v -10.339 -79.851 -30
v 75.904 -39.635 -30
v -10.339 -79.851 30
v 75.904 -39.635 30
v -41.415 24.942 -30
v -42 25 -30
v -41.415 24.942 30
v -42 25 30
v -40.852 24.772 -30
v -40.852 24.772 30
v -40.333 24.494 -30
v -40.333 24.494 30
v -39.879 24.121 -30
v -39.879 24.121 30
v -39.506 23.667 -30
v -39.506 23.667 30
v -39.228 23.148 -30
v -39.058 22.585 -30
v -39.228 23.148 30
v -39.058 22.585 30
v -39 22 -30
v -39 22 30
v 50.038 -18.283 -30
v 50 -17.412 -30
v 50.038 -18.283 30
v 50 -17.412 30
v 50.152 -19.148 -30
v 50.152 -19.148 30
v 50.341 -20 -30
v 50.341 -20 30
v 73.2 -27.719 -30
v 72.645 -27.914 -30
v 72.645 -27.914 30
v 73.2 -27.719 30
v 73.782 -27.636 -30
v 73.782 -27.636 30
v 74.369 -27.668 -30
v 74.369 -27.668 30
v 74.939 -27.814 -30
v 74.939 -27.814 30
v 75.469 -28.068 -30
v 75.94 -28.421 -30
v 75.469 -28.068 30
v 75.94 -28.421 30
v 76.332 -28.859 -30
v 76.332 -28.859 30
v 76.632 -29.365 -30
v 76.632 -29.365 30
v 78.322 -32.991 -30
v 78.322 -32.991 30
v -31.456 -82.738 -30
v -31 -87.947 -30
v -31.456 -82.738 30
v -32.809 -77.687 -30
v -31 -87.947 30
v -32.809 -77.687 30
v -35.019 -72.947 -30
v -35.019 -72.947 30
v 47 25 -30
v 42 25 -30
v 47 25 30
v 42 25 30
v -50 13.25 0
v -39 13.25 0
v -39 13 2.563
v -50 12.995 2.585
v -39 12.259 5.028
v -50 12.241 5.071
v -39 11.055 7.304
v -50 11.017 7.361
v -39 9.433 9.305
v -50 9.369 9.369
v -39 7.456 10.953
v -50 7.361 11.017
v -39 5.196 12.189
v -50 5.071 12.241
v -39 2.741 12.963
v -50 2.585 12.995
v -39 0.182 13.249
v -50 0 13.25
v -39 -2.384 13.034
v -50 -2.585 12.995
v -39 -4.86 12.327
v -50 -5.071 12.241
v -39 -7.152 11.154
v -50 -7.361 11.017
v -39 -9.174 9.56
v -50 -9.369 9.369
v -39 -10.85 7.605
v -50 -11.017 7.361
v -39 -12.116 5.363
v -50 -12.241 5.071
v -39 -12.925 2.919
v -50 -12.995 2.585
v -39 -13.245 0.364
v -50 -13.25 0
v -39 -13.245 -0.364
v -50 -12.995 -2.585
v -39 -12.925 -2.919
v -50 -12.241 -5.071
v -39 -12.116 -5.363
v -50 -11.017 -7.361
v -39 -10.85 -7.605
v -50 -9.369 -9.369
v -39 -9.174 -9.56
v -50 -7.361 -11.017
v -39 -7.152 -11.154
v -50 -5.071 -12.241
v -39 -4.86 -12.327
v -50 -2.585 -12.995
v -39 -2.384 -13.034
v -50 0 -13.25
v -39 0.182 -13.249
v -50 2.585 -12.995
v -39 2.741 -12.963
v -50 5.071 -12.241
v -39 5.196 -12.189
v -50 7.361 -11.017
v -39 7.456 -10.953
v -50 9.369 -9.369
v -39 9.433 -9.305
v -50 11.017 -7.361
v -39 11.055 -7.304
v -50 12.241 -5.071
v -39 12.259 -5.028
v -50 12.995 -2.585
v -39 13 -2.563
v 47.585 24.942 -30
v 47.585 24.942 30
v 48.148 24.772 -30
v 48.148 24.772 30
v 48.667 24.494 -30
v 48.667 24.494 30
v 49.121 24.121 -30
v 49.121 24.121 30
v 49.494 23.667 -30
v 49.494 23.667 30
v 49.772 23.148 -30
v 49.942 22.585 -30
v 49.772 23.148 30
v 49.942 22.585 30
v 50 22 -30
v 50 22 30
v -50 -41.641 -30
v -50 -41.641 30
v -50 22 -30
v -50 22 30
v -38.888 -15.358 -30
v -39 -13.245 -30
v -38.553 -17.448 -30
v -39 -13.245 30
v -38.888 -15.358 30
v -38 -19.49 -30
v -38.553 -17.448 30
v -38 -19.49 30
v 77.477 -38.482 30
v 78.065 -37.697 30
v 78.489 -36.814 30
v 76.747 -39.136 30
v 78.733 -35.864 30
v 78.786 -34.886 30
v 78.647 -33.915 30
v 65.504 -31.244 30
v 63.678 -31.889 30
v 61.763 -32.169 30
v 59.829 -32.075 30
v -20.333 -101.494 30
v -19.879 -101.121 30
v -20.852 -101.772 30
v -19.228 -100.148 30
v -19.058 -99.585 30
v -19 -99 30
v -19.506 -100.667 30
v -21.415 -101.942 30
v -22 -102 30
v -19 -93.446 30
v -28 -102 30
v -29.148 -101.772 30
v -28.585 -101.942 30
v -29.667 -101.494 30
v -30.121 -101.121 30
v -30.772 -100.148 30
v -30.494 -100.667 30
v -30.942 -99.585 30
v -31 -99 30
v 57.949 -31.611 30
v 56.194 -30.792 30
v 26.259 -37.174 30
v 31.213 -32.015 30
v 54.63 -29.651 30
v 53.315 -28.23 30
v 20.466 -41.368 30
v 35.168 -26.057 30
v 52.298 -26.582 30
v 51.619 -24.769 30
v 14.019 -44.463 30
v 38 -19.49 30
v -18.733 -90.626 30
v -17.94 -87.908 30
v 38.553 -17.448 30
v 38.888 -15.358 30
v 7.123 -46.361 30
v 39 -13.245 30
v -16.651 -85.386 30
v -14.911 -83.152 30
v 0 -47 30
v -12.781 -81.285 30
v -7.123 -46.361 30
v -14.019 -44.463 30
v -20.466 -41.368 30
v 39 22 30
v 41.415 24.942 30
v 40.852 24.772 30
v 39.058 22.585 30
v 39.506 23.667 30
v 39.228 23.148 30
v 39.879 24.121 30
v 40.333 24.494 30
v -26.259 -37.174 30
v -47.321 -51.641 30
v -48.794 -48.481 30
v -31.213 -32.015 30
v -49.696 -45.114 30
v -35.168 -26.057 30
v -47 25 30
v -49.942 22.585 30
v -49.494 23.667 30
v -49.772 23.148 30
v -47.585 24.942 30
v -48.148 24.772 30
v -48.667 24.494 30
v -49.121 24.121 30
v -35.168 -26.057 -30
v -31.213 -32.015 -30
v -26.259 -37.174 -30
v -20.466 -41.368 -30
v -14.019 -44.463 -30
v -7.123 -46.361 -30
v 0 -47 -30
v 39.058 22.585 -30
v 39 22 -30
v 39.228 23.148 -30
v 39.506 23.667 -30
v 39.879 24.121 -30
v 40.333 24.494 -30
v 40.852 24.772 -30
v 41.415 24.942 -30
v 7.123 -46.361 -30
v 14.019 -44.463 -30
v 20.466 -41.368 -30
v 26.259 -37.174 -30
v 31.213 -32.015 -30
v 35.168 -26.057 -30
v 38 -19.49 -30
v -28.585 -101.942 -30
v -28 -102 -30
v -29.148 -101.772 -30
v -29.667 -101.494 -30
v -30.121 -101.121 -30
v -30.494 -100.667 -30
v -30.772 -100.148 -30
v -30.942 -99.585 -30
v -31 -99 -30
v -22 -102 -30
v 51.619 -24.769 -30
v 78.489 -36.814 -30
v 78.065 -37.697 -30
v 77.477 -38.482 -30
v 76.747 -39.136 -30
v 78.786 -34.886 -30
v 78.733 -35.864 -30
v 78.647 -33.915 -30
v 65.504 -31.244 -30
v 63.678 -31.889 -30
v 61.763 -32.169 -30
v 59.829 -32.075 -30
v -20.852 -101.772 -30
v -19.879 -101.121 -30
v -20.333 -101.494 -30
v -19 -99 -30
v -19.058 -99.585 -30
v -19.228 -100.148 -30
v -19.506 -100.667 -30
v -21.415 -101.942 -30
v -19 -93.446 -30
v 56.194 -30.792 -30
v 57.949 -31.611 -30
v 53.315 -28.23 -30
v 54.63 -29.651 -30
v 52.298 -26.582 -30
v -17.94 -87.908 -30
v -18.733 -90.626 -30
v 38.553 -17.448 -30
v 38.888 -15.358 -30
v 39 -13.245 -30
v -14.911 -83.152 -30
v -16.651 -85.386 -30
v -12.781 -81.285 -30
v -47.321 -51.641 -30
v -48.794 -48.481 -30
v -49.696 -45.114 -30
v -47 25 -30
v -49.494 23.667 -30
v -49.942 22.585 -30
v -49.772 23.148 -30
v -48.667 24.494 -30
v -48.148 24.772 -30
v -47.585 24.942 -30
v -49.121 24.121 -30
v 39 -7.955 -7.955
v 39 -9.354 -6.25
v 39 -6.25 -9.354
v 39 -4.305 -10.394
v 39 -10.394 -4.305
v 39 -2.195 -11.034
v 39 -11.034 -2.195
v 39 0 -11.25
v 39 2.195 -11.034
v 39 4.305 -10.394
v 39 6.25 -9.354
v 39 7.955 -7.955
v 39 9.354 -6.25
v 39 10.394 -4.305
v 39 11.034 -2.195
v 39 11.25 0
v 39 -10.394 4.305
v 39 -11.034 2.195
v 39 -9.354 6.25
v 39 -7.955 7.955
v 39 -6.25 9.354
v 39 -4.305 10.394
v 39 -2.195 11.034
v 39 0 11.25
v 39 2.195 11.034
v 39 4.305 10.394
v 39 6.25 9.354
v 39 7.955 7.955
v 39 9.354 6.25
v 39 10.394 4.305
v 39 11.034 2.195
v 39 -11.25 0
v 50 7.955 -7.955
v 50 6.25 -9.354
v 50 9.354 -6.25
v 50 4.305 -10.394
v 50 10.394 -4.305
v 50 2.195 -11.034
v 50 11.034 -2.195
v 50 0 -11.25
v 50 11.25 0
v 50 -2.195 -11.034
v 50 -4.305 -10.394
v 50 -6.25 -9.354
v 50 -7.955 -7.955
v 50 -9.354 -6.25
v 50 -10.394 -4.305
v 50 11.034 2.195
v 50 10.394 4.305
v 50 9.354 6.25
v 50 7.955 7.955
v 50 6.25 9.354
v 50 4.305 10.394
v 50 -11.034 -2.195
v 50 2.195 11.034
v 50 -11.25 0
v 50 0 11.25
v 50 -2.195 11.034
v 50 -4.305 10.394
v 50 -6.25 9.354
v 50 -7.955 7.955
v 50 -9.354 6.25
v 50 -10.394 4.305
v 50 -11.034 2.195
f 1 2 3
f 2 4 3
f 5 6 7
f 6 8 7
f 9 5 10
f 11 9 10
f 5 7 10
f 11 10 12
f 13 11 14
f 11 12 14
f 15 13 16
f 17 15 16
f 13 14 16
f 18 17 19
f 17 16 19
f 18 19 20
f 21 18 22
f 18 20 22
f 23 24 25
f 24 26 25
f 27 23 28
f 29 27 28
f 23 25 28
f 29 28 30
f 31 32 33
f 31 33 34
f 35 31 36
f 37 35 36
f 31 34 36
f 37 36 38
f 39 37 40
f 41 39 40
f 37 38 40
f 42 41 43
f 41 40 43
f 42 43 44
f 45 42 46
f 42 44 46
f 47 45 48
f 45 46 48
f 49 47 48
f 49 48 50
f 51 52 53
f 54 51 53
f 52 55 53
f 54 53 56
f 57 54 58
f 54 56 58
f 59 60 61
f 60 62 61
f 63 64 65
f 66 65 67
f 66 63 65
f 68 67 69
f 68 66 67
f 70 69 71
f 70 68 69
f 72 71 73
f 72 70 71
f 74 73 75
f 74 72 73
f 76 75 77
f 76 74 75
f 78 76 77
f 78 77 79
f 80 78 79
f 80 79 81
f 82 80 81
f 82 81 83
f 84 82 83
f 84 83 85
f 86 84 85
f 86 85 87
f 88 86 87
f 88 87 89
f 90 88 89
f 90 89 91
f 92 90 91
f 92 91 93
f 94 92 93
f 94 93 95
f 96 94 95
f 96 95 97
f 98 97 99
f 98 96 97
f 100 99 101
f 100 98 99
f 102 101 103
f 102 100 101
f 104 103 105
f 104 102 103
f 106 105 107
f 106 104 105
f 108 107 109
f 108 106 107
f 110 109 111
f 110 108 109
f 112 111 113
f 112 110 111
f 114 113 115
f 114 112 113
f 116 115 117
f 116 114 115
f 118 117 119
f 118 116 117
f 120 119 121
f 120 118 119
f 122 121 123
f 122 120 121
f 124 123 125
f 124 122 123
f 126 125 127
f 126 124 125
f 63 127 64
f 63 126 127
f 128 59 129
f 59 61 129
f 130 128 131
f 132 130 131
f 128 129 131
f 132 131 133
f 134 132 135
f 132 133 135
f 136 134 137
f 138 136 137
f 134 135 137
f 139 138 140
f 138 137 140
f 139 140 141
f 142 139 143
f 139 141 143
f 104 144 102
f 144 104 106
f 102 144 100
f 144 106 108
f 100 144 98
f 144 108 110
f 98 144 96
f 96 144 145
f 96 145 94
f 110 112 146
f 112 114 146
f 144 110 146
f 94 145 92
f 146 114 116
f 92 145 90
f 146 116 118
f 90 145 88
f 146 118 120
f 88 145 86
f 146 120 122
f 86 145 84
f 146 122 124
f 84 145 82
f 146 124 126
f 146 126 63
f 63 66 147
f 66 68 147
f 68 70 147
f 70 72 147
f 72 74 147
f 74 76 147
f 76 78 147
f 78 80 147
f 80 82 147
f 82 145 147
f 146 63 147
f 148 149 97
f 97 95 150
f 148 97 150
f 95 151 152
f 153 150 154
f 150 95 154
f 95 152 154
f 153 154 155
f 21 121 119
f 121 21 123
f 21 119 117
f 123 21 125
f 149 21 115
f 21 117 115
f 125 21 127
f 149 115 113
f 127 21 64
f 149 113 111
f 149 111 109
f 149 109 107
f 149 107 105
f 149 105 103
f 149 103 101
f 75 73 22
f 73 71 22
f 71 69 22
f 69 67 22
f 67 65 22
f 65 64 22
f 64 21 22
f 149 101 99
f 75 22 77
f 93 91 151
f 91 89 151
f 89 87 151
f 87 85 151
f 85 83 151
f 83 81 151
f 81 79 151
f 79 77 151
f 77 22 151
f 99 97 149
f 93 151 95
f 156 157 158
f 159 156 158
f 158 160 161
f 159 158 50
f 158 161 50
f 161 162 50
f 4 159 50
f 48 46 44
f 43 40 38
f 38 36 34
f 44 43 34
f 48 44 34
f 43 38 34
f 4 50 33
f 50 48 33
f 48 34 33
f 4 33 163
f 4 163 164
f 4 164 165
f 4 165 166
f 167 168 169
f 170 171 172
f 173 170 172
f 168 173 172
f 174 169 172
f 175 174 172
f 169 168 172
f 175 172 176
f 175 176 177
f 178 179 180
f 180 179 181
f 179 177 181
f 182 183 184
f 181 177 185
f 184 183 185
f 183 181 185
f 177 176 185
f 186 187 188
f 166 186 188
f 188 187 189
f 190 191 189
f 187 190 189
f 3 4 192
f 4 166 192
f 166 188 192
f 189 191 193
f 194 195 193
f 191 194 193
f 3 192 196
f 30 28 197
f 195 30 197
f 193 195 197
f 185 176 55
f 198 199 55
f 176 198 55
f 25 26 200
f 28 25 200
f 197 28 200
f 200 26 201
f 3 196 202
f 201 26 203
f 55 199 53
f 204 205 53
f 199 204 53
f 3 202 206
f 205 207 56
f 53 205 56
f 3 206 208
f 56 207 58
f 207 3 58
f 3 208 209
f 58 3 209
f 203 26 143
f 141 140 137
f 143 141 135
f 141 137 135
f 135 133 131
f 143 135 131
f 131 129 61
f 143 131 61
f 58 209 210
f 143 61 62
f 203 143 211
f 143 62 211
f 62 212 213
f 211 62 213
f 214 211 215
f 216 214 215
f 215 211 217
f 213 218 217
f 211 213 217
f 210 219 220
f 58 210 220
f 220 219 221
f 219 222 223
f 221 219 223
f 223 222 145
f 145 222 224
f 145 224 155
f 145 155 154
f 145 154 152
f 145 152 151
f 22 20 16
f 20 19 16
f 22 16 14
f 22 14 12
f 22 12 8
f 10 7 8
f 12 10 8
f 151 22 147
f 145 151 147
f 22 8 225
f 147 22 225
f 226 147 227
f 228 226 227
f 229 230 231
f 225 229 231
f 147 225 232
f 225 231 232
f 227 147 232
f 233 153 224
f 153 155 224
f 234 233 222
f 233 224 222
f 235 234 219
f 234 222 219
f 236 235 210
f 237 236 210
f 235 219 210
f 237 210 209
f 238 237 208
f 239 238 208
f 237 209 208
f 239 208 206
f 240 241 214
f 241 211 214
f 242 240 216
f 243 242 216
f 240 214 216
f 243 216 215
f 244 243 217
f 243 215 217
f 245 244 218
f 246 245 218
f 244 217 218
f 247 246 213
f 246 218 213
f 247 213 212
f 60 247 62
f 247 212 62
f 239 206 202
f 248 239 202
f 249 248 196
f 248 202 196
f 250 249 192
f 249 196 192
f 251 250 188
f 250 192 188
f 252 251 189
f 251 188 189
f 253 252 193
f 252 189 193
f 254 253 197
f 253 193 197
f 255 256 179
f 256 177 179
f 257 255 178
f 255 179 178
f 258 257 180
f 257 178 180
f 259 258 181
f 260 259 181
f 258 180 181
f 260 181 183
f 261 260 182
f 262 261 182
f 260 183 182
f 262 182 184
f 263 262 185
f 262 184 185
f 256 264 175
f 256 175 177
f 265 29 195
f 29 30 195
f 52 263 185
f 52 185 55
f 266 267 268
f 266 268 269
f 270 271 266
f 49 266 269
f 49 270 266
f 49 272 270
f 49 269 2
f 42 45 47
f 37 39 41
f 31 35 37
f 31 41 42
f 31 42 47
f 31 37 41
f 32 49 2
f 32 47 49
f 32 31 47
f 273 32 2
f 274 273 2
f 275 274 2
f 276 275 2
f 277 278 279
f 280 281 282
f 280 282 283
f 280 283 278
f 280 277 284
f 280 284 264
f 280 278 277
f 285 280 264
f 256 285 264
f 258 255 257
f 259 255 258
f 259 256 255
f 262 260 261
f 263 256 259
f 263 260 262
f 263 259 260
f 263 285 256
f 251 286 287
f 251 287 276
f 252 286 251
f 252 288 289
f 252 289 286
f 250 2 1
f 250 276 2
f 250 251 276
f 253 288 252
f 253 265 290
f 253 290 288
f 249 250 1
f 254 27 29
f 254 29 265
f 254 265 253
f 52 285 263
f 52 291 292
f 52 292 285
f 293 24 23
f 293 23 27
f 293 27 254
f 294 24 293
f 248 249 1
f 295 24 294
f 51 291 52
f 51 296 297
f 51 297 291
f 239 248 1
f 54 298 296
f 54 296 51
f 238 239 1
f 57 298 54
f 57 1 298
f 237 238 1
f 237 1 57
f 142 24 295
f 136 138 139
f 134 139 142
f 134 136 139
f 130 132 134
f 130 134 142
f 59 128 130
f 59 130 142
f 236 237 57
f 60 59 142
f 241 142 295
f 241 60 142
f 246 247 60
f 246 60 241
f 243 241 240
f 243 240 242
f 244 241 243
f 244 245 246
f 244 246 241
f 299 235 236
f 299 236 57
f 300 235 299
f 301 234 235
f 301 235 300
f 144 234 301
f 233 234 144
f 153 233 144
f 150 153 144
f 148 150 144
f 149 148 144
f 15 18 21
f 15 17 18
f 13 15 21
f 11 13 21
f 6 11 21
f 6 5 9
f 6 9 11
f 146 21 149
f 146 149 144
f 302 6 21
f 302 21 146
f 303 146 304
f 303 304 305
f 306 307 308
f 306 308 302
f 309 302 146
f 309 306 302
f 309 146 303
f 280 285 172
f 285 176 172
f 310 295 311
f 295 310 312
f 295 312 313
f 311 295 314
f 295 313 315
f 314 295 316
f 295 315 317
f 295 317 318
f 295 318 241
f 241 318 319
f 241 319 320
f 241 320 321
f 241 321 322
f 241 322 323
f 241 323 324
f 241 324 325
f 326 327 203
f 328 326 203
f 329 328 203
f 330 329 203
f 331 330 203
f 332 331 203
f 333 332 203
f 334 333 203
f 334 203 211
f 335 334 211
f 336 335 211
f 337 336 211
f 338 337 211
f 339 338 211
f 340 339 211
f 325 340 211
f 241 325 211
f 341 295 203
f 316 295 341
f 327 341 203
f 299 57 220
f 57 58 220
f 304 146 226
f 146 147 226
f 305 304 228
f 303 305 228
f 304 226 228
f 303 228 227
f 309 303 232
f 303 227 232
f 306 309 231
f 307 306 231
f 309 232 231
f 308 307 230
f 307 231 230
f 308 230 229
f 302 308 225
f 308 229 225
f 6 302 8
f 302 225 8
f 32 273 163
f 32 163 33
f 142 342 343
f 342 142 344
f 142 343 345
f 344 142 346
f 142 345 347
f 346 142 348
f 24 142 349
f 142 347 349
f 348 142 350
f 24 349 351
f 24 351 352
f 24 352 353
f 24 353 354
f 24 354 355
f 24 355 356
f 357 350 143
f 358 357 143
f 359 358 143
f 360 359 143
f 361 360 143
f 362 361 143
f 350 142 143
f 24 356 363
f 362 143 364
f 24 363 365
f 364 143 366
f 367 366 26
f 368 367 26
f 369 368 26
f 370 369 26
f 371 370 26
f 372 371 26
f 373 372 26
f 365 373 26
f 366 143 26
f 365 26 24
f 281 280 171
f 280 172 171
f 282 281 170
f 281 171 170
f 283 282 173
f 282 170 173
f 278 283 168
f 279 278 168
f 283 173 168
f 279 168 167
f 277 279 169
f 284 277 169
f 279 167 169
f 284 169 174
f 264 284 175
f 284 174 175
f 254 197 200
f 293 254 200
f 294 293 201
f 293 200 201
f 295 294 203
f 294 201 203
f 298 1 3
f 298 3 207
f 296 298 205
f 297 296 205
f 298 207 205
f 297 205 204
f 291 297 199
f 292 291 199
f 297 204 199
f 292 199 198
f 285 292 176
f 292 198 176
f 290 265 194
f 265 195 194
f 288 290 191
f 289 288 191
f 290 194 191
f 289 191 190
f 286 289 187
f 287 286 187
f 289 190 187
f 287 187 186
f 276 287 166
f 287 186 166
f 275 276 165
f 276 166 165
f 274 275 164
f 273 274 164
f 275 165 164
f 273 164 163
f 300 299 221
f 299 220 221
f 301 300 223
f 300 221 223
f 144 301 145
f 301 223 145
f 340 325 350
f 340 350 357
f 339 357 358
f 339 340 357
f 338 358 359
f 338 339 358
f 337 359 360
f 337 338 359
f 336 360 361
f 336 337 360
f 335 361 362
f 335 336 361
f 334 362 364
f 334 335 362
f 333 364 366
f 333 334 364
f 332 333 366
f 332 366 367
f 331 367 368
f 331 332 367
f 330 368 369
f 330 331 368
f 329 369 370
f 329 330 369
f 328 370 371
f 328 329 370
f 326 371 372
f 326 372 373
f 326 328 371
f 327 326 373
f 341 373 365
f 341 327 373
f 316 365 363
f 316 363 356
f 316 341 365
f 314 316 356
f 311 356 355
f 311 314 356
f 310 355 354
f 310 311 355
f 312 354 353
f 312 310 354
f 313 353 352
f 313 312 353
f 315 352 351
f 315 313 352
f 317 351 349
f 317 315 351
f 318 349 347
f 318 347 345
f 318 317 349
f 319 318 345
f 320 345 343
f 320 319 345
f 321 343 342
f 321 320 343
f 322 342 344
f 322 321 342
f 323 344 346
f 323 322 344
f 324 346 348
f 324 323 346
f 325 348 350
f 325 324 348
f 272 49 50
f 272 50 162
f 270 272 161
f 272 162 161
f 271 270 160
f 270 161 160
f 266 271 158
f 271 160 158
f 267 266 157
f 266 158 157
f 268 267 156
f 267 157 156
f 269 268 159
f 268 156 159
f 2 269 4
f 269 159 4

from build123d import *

# Parameters (mm, degrees)
BASE_EXTRUDE_DEPTH = 30


with BuildPart() as part:
    # Sketch1 → Base-Extrude (new body, symmetric)
    with BuildSketch(Plane.XY):
        with BuildLine():
            Line((39, -13.244998), (39, 22))
            ThreePointArc((39, 22), (39.87868, 24.12132), (42, 25))
            Line((42, 25), (47, 25))
            ThreePointArc((47, 25), (49.12132, 24.12132), (50, 22))
            Line((50, 22), (50, -17.41181))
            ThreePointArc((50, -17.41181), (50.085551, -18.717071), (50.340742, -20))
            Line((50.340742, -20), (51.61865, -24.769217))
            ThreePointArc((51.61865, -24.769217), (57.051725, -31.244104), (65.50409, -31.244104))
            Line((65.50409, -31.244104), (72.645011, -27.914239))
            ThreePointArc((72.645011, -27.914239), (74.938926, -27.814084), (76.631789, -29.365307))
            Line((76.631789, -29.365307), (78.322262, -32.990538))
            ThreePointArc((78.322262, -32.990538), (78.489186, -36.81373), (75.903815, -39.635168))
            Line((75.903815, -39.635168), (-10.339274, -79.850981))
            ThreePointArc((-10.339274, -79.850981), (-16.650872, -85.386104), (-19, -93.445598))
            Line((-19, -93.445598), (-19, -99))
            ThreePointArc((-19, -99), (-19.87868, -101.12132), (-22, -102))
            Line((-22, -102), (-28, -102))
            ThreePointArc((-28, -102), (-30.12132, -101.12132), (-31, -99))
            Line((-31, -99), (-31, -87.947441))
            ThreePointArc((-31, -87.947441), (-32.022225, -80.18287), (-35.019238, -72.947441))
            Line((-35.019238, -72.947441), (-47.320508, -51.641016))
            ThreePointArc((-47.320508, -51.641016), (-49.318517, -46.817397), (-50, -41.641016))
            Line((-50, -41.641016), (-50, 22))
            ThreePointArc((-50, 22), (-49.12132, 24.12132), (-47, 25))
            Line((-47, 25), (-42, 25))
            ThreePointArc((-42, 25), (-39.87868, 24.12132), (-39, 22))
            Line((-39, 22), (-39, -13.244998))
            ThreePointArc((-39, -13.244998), (-38.748418, -16.407276), (-38, -19.489996))
            ThreePointArc((-38, -19.489996), (-23.456344, -39.400616), (0, -47))
            ThreePointArc((0, -47), (23.456344, -39.400616), (38, -19.489996))
            ThreePointArc((38, -19.489996), (38.748418, -16.407276), (39, -13.244998))
        make_face()
    extrude(amount=BASE_EXTRUDE_DEPTH, both=True)

    # Sketch4 → Udboring ø26.5/ø22.5 (revolve, cut)
    with BuildSketch(Plane.XY):
        Polygon((50, 11.25), (0, 11.25), (0, 13.25), (-50, 13.25), (-50, 0), (0, 0), (50, 0), align=None)
    revolve(axis=Axis((0, 0, 0), (1, 0, 0)), mode=Mode.SUBTRACT)


solid = part.part
